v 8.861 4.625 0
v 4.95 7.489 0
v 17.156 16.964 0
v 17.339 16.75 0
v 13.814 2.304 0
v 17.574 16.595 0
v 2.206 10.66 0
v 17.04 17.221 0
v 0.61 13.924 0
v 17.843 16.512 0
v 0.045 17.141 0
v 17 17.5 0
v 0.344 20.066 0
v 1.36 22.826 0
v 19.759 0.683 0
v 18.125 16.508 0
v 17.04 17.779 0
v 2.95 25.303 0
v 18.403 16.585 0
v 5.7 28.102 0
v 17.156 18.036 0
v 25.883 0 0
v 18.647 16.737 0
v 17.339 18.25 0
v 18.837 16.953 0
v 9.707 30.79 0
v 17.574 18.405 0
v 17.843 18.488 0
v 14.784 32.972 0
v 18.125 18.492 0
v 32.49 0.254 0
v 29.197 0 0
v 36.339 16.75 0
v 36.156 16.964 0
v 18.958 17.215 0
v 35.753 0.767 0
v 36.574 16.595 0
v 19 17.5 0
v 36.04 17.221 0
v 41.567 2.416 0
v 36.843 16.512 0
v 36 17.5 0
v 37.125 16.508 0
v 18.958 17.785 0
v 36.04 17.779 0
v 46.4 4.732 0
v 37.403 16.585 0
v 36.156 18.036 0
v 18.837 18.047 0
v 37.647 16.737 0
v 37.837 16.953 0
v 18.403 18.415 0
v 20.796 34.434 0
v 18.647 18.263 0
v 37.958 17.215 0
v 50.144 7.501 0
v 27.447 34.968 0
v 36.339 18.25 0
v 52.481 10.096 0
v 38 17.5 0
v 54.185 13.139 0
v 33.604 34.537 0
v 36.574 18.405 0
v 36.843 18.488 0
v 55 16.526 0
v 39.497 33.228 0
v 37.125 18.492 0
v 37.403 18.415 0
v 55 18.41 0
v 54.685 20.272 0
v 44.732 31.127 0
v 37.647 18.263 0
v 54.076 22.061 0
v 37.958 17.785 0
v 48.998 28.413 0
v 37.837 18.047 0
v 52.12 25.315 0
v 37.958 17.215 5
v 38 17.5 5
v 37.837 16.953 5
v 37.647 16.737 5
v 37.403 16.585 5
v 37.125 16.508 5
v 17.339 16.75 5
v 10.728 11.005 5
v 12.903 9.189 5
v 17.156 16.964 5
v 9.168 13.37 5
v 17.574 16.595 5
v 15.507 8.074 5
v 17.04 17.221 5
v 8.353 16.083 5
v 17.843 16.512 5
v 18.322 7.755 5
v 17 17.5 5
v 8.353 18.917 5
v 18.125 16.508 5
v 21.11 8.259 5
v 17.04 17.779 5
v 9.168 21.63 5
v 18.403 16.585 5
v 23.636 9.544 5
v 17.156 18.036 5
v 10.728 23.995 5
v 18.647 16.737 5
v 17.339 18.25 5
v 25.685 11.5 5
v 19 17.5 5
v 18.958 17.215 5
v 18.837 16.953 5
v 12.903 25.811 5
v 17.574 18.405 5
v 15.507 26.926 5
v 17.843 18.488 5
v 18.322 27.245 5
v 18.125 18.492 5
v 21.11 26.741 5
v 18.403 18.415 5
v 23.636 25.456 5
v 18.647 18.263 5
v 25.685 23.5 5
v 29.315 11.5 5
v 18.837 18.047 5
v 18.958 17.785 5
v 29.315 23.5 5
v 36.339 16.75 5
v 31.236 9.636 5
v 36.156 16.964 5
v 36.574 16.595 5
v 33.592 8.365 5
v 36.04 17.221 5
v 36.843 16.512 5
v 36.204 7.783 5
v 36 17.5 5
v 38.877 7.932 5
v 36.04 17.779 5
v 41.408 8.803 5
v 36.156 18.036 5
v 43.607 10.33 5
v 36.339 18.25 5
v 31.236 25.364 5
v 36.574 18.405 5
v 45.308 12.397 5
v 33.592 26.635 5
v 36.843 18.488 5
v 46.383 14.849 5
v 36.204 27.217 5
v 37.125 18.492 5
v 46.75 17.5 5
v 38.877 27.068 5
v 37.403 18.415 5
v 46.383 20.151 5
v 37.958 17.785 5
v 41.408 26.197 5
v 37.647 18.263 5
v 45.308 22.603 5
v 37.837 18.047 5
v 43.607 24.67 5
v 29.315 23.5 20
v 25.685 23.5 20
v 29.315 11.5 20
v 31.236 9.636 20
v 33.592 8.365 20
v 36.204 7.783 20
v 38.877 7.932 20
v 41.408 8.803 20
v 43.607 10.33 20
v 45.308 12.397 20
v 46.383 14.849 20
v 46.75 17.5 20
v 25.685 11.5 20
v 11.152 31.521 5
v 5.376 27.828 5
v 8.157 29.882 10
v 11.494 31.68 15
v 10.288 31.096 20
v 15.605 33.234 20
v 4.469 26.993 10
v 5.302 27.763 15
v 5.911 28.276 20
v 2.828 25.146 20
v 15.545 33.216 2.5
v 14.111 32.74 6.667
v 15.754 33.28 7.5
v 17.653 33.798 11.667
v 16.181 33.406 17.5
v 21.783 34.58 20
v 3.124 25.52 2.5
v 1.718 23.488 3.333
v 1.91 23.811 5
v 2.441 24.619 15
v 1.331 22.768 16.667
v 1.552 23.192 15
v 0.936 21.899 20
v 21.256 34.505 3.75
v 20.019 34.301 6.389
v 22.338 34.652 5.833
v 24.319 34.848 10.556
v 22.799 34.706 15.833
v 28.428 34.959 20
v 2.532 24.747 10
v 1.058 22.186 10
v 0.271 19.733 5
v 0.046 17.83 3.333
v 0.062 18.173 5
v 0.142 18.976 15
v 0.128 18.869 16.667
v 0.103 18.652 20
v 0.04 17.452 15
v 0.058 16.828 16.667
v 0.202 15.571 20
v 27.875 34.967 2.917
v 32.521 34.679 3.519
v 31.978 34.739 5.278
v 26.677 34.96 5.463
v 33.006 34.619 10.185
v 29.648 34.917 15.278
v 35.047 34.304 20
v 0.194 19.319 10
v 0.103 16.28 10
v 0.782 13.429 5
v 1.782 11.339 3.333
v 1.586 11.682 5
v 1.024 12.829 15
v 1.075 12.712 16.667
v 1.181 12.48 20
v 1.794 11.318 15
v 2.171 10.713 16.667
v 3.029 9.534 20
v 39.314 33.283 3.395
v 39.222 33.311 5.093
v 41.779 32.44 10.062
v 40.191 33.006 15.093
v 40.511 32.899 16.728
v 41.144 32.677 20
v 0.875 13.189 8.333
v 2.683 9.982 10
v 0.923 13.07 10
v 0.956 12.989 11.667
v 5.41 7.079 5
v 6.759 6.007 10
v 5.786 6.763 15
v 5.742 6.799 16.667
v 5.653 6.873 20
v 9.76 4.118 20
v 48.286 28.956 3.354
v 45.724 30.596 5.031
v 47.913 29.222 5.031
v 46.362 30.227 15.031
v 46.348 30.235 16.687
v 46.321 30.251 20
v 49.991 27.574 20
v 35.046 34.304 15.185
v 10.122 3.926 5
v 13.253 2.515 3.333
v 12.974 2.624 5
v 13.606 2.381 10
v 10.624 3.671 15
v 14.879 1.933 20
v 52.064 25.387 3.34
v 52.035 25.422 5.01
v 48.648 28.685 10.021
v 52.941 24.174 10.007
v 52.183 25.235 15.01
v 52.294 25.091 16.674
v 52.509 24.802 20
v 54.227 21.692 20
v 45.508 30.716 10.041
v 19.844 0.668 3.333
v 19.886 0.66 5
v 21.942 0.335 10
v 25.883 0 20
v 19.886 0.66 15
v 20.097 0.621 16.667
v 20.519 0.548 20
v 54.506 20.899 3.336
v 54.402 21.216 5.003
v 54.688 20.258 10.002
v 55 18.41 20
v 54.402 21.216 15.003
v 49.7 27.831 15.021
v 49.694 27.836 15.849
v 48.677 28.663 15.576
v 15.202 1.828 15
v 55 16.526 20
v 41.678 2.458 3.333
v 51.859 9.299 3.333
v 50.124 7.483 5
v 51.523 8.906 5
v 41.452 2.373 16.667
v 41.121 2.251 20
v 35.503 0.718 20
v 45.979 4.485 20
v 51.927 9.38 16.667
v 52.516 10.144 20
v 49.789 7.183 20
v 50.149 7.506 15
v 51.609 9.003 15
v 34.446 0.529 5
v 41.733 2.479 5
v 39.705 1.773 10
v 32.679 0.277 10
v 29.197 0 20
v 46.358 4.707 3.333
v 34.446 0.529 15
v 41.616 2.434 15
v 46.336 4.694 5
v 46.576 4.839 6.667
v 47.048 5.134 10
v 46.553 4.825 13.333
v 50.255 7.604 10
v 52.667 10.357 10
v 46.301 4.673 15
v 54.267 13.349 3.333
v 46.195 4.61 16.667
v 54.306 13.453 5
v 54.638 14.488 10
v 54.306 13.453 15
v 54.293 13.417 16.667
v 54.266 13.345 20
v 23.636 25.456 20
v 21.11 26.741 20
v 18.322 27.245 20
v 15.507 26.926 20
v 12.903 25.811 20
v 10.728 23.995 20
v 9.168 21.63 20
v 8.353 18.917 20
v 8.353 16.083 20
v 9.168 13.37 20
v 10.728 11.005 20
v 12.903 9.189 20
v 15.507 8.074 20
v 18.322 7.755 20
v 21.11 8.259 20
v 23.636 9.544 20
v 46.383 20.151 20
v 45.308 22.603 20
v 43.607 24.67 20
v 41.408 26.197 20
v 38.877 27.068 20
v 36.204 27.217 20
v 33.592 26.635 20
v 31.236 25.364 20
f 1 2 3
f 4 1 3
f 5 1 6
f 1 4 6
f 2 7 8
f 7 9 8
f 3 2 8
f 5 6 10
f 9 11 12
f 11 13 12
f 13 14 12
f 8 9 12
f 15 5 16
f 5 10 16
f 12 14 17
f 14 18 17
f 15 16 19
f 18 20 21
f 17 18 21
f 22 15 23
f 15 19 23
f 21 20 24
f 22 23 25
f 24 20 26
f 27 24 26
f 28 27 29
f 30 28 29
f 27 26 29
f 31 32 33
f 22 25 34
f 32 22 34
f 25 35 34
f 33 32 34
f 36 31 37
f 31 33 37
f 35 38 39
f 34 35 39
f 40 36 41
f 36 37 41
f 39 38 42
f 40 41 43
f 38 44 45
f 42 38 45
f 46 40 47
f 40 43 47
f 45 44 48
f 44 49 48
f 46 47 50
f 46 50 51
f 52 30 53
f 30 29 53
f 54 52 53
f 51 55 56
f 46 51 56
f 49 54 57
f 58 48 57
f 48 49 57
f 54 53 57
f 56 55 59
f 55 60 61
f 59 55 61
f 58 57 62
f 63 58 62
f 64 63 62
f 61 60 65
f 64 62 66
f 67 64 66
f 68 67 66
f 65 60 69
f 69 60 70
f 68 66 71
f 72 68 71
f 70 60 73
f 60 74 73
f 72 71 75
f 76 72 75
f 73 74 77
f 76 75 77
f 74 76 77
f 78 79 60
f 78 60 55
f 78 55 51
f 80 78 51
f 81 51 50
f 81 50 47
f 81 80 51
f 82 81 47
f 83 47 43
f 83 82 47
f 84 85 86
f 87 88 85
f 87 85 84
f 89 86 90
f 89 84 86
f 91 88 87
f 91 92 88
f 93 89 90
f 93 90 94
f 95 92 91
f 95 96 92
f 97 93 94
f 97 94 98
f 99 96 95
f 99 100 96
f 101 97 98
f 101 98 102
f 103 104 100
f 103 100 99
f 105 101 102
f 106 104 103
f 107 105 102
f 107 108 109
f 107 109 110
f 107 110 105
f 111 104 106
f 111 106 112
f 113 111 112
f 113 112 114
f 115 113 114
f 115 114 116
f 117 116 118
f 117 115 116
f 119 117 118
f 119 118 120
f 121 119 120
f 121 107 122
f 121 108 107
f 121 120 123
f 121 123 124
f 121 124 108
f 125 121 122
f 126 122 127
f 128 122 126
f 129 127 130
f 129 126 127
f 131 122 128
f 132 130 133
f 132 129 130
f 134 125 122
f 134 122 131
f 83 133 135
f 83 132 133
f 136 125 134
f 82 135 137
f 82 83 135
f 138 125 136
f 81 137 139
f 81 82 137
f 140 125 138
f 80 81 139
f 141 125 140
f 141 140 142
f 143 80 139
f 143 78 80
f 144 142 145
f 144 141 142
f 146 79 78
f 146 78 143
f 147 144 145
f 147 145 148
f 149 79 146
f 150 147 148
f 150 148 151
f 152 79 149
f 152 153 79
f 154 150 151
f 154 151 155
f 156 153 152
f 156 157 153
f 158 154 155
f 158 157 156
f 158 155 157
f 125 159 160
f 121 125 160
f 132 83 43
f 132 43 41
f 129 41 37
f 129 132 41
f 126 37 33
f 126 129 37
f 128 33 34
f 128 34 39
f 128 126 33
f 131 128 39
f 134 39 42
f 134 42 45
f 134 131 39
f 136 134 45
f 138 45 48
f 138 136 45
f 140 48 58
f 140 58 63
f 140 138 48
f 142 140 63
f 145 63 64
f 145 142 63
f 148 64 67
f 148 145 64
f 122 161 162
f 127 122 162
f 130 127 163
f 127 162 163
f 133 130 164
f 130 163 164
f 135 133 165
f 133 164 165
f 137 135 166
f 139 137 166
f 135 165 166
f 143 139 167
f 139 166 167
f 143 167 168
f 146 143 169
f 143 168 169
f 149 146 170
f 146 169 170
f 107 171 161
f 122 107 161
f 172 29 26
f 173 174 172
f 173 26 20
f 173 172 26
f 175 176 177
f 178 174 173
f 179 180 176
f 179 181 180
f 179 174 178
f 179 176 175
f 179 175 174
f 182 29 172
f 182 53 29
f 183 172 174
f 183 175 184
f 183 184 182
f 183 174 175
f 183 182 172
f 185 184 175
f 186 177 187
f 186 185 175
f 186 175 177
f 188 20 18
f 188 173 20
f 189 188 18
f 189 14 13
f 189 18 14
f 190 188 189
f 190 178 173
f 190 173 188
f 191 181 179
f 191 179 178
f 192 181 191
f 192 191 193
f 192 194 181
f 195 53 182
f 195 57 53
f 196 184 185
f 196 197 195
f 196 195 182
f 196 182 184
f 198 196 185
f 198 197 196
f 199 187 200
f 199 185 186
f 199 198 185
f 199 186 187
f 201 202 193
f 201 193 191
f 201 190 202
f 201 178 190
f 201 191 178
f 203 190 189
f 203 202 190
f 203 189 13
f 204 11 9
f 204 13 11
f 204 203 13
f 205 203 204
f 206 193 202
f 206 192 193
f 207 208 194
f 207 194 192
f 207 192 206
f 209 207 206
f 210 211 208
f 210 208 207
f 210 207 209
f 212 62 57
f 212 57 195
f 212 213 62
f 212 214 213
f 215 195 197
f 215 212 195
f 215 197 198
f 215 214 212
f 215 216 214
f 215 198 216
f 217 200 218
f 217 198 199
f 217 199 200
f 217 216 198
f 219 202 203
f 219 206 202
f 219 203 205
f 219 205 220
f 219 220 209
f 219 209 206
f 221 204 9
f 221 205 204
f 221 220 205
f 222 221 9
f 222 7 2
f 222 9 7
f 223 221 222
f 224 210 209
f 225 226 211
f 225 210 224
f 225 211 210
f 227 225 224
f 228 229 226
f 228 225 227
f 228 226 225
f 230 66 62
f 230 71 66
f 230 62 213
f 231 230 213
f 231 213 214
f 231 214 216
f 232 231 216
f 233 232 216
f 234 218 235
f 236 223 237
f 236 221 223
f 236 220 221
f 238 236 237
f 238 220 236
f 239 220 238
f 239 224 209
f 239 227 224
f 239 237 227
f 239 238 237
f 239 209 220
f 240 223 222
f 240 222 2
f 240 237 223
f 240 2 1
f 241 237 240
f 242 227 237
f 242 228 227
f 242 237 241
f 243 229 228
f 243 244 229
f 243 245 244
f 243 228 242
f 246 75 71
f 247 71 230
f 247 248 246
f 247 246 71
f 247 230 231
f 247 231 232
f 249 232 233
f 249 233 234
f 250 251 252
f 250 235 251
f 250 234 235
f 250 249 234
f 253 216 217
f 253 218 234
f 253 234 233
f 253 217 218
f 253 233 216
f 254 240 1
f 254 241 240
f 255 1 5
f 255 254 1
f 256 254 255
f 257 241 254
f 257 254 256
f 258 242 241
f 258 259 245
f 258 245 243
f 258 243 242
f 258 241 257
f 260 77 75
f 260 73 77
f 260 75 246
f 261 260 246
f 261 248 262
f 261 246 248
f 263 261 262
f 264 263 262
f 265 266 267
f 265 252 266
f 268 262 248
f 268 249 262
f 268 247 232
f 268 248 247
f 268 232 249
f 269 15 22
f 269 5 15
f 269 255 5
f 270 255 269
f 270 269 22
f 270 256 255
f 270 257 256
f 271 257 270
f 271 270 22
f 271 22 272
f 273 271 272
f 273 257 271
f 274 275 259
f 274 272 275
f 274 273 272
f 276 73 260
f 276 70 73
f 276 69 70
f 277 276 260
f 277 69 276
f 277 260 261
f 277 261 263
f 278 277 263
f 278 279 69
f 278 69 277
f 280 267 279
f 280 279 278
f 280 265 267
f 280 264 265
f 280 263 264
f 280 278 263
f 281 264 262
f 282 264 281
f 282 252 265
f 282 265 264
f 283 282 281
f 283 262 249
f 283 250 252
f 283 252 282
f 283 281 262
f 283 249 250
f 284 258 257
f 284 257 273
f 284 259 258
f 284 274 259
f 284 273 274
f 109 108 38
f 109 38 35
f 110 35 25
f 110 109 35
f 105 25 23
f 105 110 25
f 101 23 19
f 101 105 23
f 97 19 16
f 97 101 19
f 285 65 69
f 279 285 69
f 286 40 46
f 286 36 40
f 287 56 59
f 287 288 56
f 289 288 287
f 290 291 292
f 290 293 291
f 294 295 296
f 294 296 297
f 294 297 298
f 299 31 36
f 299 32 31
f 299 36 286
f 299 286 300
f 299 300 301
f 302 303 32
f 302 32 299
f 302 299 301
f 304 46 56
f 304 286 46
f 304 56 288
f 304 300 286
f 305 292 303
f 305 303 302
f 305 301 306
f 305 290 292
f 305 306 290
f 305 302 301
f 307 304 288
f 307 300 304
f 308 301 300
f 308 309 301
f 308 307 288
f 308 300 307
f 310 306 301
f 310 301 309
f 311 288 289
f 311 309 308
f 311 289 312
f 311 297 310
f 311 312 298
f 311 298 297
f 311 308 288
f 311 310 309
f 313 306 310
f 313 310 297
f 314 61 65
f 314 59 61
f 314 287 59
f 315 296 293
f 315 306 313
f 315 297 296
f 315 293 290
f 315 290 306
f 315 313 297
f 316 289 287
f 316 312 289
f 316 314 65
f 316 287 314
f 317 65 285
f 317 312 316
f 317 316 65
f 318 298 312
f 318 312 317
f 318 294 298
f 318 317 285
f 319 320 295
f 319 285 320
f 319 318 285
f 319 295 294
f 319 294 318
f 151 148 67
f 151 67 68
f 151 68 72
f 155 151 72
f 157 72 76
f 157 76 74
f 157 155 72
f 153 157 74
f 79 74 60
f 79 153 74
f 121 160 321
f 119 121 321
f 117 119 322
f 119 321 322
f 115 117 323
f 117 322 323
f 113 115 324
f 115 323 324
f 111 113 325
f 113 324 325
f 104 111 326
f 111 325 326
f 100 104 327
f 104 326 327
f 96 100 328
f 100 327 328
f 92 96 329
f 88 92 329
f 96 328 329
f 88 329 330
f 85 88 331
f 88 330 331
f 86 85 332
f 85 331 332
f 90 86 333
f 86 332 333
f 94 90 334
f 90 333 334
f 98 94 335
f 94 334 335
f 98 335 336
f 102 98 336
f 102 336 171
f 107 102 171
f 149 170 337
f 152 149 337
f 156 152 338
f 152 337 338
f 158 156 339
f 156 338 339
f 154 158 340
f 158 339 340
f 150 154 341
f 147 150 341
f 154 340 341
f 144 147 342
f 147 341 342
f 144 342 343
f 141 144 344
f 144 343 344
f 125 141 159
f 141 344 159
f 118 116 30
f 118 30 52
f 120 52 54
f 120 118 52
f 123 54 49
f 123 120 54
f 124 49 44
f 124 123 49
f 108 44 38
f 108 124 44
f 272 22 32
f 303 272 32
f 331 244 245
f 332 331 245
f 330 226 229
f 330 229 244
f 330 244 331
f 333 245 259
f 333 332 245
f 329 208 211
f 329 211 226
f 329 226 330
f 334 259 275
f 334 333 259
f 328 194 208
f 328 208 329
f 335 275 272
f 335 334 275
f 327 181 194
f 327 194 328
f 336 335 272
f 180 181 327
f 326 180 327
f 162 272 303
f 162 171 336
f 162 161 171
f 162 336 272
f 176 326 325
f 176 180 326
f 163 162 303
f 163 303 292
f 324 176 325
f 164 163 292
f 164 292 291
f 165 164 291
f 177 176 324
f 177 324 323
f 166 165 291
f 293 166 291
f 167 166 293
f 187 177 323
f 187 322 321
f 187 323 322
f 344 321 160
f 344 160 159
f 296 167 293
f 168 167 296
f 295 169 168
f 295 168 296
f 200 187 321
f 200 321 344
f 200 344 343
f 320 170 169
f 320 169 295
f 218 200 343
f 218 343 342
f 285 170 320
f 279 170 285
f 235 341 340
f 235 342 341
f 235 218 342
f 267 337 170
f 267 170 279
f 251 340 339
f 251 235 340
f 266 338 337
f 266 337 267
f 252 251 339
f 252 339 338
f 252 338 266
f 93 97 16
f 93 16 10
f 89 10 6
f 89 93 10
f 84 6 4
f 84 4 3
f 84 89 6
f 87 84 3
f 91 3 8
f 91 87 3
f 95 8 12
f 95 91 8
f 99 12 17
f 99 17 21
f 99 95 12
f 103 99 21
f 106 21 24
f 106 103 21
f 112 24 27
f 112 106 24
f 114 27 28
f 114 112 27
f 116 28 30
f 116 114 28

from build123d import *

# Parameters (mm, degrees)
F0_W     = 55
F0_H     = 35
F1_DEPTH = 20
F3_DEPTH = 15
F4_DEPTH = 20
F6_DEPTH = 25


with BuildPart() as f1:
    # F0 (on Top) → F1 (new body)
    with BuildSketch(Plane.XY):
        with Locations((27.5, 17.5)):
            Rectangle(F0_W, F0_H)
    extrude(amount=F1_DEPTH)

    # F2 (on face) → F3 (cut)
    with BuildSketch(Plane.XY.offset(20)):
        with BuildLine():
            ThreePointArc((25.6852130745, 23.5), (26.8008402334, 21.6961543331), (27.5, 19.6937410968))
            ThreePointArc((27.5, 19.6937410968), (28.1991597666, 21.6961543331), (29.3147869255, 23.5))
            Line((29.3147869255, 23.5), (25.6852130745, 23.5))
        make_face()
        with BuildLine():
            ThreePointArc((27.5, 15.3062589032), (27.687298385, 16.3960298917), (27.75, 17.5))
            ThreePointArc((27.75, 17.5), (27.687298385, 18.6039701083), (27.5, 19.6937410968))
            ThreePointArc((27.5, 19.6937410968), (27.25, 17.5), (27.5, 15.3062589032))
        make_face()
        with BuildLine():
            ThreePointArc((27.5, 15.3062589032), (27.25, 17.5), (27.5, 19.6937410968))
            ThreePointArc((27.5, 19.6937410968), (26.8008402334, 21.6961543331), (25.6852130745, 23.5))
            Line((25.6852130745, 23.5), (18.1248368174, 23.5))
            Line((18.1248368174, 23.5), (18.1248368174, 18.4921772871))
            ThreePointArc((18.1248368174, 18.4921772871), (18.7499456038, 18.1614995021), (19, 17.5))
            ThreePointArc((19, 17.5), (18.7499456038, 16.8385004979), (18.1248368174, 16.5078227129))
            Line((18.1248368174, 16.5078227129), (18.1248368174, 11.5))
            Line((18.1248368174, 11.5), (25.6852130745, 11.5))
            ThreePointArc((25.6852130745, 11.5), (26.8008402334, 13.3038456669), (27.5, 15.3062589032))
        make_face()
        with BuildLine():
            Line((18.1248368174, 23.5), (25.6852130745, 23.5))
            ThreePointArc((25.6852130745, 23.5), (8.25, 17.5), (25.6852130745, 11.5))
            Line((25.6852130745, 11.5), (18.1248368174, 11.5))
            Line((18.1248368174, 11.5), (18.1248368174, 16.5078227129))
            ThreePointArc((18.1248368174, 16.5078227129), (17, 17.5), (18.1248368174, 18.4921772871))
            Line((18.1248368174, 18.4921772871), (18.1248368174, 23.5))
        make_face()
        with BuildLine():
            ThreePointArc((27.5, 19.6937410968), (27.687298385, 18.6039701083), (27.75, 17.5))
            ThreePointArc((27.75, 17.5), (27.687298385, 16.3960298917), (27.5, 15.3062589032))
            ThreePointArc((27.5, 15.3062589032), (28.1991597666, 13.3038456669), (29.3147869255, 11.5))
            Line((29.3147869255, 11.5), (37.1248368174, 11.5))
            Line((37.1248368174, 11.5), (37.1248368174, 16.5078227129))
            ThreePointArc((37.1248368174, 16.5078227129), (36, 17.5), (37.1248368174, 18.4921772871))
            Line((37.1248368174, 18.4921772871), (37.1248368174, 23.5))
            Line((37.1248368174, 23.5), (29.3147869255, 23.5))
            ThreePointArc((29.3147869255, 23.5), (28.1991597666, 21.6961543331), (27.5, 19.6937410968))
        make_face()
        with BuildLine():
            ThreePointArc((29.3147869255, 11.5), (28.1991597666, 13.3038456669), (27.5, 15.3062589032))
            ThreePointArc((27.5, 15.3062589032), (26.8008402334, 13.3038456669), (25.6852130745, 11.5))
            Line((25.6852130745, 11.5), (29.3147869255, 11.5))
        make_face()
        with BuildLine():
            ThreePointArc((46.75, 17.5), (40.1726702101, 26.7193635213), (29.3147869255, 23.5))
            Line((29.3147869255, 23.5), (37.1248368174, 23.5))
            Line((37.1248368174, 23.5), (37.1248368174, 18.4921772871))
            ThreePointArc((37.1248368174, 18.4921772871), (37.7499456038, 18.1614995021), (38, 17.5))
            ThreePointArc((38, 17.5), (37.7499456038, 16.8385004979), (37.1248368174, 16.5078227129))
            Line((37.1248368174, 16.5078227129), (37.1248368174, 11.5))
            Line((37.1248368174, 11.5), (29.3147869255, 11.5))
            ThreePointArc((29.3147869255, 11.5), (40.1726702101, 8.2806364787), (46.75, 17.5))
        make_face()
    extrude(amount=-F3_DEPTH, mode=Mode.SUBTRACT)

    # F4 (cut): faces of the model
    f4_faces = [f1.faces().sort_by_distance(p)[0] for p in [
        (18, 17.5, 20),
        (37, 17.5, 20),
    ]]
    extrude(f4_faces, amount=-F4_DEPTH, mode=Mode.SUBTRACT)

    # F5 (on face) → F6 (cut)
    with BuildSketch(Plane.XY.offset(20)):
        with BuildLine():
            add(Edge.make_bspline(
                [(55, 18.4103445183), (51.6957322132, 57.4114078131), (8.1569687974, 29.882241531), (-35.3817946184, 2.3530752488), (25.883112617, 0)],
                knots=[0.0538621738, 0.0538621738, 0.0538621738, 2.3529842643, 2.3529842643, 4.6521063548, 4.6521063548, 4.6521063548], degree=2, weights=[1, 0.4088880636, 1, 0.4088880636, 1]))
            Line((55, 18.4103445183), (55, 35))
            Line((55, 35), (0, 35))
            Line((0, 35), (0, 0))
            Line((0, 0), (25.883112617, 0))
        make_face()
        with BuildLine():
            Line((55, 0), (55, 16.5260798265))
            add(Edge.make_bspline(
                [(29.1966492756, 0), (53.6795374022, 0.9403438391), (55, 16.5260798265)],
                knots=[4.7726716059, 4.7726716059, 4.7726716059, 6.2293231333, 6.2293231333, 6.2293231333], degree=2, weights=[1, 0.7462898548, 1]))
            Line((29.1966492756, 0), (55, 0))
        make_face()
    extrude(amount=-F6_DEPTH, mode=Mode.SUBTRACT)


solid = f1.part
